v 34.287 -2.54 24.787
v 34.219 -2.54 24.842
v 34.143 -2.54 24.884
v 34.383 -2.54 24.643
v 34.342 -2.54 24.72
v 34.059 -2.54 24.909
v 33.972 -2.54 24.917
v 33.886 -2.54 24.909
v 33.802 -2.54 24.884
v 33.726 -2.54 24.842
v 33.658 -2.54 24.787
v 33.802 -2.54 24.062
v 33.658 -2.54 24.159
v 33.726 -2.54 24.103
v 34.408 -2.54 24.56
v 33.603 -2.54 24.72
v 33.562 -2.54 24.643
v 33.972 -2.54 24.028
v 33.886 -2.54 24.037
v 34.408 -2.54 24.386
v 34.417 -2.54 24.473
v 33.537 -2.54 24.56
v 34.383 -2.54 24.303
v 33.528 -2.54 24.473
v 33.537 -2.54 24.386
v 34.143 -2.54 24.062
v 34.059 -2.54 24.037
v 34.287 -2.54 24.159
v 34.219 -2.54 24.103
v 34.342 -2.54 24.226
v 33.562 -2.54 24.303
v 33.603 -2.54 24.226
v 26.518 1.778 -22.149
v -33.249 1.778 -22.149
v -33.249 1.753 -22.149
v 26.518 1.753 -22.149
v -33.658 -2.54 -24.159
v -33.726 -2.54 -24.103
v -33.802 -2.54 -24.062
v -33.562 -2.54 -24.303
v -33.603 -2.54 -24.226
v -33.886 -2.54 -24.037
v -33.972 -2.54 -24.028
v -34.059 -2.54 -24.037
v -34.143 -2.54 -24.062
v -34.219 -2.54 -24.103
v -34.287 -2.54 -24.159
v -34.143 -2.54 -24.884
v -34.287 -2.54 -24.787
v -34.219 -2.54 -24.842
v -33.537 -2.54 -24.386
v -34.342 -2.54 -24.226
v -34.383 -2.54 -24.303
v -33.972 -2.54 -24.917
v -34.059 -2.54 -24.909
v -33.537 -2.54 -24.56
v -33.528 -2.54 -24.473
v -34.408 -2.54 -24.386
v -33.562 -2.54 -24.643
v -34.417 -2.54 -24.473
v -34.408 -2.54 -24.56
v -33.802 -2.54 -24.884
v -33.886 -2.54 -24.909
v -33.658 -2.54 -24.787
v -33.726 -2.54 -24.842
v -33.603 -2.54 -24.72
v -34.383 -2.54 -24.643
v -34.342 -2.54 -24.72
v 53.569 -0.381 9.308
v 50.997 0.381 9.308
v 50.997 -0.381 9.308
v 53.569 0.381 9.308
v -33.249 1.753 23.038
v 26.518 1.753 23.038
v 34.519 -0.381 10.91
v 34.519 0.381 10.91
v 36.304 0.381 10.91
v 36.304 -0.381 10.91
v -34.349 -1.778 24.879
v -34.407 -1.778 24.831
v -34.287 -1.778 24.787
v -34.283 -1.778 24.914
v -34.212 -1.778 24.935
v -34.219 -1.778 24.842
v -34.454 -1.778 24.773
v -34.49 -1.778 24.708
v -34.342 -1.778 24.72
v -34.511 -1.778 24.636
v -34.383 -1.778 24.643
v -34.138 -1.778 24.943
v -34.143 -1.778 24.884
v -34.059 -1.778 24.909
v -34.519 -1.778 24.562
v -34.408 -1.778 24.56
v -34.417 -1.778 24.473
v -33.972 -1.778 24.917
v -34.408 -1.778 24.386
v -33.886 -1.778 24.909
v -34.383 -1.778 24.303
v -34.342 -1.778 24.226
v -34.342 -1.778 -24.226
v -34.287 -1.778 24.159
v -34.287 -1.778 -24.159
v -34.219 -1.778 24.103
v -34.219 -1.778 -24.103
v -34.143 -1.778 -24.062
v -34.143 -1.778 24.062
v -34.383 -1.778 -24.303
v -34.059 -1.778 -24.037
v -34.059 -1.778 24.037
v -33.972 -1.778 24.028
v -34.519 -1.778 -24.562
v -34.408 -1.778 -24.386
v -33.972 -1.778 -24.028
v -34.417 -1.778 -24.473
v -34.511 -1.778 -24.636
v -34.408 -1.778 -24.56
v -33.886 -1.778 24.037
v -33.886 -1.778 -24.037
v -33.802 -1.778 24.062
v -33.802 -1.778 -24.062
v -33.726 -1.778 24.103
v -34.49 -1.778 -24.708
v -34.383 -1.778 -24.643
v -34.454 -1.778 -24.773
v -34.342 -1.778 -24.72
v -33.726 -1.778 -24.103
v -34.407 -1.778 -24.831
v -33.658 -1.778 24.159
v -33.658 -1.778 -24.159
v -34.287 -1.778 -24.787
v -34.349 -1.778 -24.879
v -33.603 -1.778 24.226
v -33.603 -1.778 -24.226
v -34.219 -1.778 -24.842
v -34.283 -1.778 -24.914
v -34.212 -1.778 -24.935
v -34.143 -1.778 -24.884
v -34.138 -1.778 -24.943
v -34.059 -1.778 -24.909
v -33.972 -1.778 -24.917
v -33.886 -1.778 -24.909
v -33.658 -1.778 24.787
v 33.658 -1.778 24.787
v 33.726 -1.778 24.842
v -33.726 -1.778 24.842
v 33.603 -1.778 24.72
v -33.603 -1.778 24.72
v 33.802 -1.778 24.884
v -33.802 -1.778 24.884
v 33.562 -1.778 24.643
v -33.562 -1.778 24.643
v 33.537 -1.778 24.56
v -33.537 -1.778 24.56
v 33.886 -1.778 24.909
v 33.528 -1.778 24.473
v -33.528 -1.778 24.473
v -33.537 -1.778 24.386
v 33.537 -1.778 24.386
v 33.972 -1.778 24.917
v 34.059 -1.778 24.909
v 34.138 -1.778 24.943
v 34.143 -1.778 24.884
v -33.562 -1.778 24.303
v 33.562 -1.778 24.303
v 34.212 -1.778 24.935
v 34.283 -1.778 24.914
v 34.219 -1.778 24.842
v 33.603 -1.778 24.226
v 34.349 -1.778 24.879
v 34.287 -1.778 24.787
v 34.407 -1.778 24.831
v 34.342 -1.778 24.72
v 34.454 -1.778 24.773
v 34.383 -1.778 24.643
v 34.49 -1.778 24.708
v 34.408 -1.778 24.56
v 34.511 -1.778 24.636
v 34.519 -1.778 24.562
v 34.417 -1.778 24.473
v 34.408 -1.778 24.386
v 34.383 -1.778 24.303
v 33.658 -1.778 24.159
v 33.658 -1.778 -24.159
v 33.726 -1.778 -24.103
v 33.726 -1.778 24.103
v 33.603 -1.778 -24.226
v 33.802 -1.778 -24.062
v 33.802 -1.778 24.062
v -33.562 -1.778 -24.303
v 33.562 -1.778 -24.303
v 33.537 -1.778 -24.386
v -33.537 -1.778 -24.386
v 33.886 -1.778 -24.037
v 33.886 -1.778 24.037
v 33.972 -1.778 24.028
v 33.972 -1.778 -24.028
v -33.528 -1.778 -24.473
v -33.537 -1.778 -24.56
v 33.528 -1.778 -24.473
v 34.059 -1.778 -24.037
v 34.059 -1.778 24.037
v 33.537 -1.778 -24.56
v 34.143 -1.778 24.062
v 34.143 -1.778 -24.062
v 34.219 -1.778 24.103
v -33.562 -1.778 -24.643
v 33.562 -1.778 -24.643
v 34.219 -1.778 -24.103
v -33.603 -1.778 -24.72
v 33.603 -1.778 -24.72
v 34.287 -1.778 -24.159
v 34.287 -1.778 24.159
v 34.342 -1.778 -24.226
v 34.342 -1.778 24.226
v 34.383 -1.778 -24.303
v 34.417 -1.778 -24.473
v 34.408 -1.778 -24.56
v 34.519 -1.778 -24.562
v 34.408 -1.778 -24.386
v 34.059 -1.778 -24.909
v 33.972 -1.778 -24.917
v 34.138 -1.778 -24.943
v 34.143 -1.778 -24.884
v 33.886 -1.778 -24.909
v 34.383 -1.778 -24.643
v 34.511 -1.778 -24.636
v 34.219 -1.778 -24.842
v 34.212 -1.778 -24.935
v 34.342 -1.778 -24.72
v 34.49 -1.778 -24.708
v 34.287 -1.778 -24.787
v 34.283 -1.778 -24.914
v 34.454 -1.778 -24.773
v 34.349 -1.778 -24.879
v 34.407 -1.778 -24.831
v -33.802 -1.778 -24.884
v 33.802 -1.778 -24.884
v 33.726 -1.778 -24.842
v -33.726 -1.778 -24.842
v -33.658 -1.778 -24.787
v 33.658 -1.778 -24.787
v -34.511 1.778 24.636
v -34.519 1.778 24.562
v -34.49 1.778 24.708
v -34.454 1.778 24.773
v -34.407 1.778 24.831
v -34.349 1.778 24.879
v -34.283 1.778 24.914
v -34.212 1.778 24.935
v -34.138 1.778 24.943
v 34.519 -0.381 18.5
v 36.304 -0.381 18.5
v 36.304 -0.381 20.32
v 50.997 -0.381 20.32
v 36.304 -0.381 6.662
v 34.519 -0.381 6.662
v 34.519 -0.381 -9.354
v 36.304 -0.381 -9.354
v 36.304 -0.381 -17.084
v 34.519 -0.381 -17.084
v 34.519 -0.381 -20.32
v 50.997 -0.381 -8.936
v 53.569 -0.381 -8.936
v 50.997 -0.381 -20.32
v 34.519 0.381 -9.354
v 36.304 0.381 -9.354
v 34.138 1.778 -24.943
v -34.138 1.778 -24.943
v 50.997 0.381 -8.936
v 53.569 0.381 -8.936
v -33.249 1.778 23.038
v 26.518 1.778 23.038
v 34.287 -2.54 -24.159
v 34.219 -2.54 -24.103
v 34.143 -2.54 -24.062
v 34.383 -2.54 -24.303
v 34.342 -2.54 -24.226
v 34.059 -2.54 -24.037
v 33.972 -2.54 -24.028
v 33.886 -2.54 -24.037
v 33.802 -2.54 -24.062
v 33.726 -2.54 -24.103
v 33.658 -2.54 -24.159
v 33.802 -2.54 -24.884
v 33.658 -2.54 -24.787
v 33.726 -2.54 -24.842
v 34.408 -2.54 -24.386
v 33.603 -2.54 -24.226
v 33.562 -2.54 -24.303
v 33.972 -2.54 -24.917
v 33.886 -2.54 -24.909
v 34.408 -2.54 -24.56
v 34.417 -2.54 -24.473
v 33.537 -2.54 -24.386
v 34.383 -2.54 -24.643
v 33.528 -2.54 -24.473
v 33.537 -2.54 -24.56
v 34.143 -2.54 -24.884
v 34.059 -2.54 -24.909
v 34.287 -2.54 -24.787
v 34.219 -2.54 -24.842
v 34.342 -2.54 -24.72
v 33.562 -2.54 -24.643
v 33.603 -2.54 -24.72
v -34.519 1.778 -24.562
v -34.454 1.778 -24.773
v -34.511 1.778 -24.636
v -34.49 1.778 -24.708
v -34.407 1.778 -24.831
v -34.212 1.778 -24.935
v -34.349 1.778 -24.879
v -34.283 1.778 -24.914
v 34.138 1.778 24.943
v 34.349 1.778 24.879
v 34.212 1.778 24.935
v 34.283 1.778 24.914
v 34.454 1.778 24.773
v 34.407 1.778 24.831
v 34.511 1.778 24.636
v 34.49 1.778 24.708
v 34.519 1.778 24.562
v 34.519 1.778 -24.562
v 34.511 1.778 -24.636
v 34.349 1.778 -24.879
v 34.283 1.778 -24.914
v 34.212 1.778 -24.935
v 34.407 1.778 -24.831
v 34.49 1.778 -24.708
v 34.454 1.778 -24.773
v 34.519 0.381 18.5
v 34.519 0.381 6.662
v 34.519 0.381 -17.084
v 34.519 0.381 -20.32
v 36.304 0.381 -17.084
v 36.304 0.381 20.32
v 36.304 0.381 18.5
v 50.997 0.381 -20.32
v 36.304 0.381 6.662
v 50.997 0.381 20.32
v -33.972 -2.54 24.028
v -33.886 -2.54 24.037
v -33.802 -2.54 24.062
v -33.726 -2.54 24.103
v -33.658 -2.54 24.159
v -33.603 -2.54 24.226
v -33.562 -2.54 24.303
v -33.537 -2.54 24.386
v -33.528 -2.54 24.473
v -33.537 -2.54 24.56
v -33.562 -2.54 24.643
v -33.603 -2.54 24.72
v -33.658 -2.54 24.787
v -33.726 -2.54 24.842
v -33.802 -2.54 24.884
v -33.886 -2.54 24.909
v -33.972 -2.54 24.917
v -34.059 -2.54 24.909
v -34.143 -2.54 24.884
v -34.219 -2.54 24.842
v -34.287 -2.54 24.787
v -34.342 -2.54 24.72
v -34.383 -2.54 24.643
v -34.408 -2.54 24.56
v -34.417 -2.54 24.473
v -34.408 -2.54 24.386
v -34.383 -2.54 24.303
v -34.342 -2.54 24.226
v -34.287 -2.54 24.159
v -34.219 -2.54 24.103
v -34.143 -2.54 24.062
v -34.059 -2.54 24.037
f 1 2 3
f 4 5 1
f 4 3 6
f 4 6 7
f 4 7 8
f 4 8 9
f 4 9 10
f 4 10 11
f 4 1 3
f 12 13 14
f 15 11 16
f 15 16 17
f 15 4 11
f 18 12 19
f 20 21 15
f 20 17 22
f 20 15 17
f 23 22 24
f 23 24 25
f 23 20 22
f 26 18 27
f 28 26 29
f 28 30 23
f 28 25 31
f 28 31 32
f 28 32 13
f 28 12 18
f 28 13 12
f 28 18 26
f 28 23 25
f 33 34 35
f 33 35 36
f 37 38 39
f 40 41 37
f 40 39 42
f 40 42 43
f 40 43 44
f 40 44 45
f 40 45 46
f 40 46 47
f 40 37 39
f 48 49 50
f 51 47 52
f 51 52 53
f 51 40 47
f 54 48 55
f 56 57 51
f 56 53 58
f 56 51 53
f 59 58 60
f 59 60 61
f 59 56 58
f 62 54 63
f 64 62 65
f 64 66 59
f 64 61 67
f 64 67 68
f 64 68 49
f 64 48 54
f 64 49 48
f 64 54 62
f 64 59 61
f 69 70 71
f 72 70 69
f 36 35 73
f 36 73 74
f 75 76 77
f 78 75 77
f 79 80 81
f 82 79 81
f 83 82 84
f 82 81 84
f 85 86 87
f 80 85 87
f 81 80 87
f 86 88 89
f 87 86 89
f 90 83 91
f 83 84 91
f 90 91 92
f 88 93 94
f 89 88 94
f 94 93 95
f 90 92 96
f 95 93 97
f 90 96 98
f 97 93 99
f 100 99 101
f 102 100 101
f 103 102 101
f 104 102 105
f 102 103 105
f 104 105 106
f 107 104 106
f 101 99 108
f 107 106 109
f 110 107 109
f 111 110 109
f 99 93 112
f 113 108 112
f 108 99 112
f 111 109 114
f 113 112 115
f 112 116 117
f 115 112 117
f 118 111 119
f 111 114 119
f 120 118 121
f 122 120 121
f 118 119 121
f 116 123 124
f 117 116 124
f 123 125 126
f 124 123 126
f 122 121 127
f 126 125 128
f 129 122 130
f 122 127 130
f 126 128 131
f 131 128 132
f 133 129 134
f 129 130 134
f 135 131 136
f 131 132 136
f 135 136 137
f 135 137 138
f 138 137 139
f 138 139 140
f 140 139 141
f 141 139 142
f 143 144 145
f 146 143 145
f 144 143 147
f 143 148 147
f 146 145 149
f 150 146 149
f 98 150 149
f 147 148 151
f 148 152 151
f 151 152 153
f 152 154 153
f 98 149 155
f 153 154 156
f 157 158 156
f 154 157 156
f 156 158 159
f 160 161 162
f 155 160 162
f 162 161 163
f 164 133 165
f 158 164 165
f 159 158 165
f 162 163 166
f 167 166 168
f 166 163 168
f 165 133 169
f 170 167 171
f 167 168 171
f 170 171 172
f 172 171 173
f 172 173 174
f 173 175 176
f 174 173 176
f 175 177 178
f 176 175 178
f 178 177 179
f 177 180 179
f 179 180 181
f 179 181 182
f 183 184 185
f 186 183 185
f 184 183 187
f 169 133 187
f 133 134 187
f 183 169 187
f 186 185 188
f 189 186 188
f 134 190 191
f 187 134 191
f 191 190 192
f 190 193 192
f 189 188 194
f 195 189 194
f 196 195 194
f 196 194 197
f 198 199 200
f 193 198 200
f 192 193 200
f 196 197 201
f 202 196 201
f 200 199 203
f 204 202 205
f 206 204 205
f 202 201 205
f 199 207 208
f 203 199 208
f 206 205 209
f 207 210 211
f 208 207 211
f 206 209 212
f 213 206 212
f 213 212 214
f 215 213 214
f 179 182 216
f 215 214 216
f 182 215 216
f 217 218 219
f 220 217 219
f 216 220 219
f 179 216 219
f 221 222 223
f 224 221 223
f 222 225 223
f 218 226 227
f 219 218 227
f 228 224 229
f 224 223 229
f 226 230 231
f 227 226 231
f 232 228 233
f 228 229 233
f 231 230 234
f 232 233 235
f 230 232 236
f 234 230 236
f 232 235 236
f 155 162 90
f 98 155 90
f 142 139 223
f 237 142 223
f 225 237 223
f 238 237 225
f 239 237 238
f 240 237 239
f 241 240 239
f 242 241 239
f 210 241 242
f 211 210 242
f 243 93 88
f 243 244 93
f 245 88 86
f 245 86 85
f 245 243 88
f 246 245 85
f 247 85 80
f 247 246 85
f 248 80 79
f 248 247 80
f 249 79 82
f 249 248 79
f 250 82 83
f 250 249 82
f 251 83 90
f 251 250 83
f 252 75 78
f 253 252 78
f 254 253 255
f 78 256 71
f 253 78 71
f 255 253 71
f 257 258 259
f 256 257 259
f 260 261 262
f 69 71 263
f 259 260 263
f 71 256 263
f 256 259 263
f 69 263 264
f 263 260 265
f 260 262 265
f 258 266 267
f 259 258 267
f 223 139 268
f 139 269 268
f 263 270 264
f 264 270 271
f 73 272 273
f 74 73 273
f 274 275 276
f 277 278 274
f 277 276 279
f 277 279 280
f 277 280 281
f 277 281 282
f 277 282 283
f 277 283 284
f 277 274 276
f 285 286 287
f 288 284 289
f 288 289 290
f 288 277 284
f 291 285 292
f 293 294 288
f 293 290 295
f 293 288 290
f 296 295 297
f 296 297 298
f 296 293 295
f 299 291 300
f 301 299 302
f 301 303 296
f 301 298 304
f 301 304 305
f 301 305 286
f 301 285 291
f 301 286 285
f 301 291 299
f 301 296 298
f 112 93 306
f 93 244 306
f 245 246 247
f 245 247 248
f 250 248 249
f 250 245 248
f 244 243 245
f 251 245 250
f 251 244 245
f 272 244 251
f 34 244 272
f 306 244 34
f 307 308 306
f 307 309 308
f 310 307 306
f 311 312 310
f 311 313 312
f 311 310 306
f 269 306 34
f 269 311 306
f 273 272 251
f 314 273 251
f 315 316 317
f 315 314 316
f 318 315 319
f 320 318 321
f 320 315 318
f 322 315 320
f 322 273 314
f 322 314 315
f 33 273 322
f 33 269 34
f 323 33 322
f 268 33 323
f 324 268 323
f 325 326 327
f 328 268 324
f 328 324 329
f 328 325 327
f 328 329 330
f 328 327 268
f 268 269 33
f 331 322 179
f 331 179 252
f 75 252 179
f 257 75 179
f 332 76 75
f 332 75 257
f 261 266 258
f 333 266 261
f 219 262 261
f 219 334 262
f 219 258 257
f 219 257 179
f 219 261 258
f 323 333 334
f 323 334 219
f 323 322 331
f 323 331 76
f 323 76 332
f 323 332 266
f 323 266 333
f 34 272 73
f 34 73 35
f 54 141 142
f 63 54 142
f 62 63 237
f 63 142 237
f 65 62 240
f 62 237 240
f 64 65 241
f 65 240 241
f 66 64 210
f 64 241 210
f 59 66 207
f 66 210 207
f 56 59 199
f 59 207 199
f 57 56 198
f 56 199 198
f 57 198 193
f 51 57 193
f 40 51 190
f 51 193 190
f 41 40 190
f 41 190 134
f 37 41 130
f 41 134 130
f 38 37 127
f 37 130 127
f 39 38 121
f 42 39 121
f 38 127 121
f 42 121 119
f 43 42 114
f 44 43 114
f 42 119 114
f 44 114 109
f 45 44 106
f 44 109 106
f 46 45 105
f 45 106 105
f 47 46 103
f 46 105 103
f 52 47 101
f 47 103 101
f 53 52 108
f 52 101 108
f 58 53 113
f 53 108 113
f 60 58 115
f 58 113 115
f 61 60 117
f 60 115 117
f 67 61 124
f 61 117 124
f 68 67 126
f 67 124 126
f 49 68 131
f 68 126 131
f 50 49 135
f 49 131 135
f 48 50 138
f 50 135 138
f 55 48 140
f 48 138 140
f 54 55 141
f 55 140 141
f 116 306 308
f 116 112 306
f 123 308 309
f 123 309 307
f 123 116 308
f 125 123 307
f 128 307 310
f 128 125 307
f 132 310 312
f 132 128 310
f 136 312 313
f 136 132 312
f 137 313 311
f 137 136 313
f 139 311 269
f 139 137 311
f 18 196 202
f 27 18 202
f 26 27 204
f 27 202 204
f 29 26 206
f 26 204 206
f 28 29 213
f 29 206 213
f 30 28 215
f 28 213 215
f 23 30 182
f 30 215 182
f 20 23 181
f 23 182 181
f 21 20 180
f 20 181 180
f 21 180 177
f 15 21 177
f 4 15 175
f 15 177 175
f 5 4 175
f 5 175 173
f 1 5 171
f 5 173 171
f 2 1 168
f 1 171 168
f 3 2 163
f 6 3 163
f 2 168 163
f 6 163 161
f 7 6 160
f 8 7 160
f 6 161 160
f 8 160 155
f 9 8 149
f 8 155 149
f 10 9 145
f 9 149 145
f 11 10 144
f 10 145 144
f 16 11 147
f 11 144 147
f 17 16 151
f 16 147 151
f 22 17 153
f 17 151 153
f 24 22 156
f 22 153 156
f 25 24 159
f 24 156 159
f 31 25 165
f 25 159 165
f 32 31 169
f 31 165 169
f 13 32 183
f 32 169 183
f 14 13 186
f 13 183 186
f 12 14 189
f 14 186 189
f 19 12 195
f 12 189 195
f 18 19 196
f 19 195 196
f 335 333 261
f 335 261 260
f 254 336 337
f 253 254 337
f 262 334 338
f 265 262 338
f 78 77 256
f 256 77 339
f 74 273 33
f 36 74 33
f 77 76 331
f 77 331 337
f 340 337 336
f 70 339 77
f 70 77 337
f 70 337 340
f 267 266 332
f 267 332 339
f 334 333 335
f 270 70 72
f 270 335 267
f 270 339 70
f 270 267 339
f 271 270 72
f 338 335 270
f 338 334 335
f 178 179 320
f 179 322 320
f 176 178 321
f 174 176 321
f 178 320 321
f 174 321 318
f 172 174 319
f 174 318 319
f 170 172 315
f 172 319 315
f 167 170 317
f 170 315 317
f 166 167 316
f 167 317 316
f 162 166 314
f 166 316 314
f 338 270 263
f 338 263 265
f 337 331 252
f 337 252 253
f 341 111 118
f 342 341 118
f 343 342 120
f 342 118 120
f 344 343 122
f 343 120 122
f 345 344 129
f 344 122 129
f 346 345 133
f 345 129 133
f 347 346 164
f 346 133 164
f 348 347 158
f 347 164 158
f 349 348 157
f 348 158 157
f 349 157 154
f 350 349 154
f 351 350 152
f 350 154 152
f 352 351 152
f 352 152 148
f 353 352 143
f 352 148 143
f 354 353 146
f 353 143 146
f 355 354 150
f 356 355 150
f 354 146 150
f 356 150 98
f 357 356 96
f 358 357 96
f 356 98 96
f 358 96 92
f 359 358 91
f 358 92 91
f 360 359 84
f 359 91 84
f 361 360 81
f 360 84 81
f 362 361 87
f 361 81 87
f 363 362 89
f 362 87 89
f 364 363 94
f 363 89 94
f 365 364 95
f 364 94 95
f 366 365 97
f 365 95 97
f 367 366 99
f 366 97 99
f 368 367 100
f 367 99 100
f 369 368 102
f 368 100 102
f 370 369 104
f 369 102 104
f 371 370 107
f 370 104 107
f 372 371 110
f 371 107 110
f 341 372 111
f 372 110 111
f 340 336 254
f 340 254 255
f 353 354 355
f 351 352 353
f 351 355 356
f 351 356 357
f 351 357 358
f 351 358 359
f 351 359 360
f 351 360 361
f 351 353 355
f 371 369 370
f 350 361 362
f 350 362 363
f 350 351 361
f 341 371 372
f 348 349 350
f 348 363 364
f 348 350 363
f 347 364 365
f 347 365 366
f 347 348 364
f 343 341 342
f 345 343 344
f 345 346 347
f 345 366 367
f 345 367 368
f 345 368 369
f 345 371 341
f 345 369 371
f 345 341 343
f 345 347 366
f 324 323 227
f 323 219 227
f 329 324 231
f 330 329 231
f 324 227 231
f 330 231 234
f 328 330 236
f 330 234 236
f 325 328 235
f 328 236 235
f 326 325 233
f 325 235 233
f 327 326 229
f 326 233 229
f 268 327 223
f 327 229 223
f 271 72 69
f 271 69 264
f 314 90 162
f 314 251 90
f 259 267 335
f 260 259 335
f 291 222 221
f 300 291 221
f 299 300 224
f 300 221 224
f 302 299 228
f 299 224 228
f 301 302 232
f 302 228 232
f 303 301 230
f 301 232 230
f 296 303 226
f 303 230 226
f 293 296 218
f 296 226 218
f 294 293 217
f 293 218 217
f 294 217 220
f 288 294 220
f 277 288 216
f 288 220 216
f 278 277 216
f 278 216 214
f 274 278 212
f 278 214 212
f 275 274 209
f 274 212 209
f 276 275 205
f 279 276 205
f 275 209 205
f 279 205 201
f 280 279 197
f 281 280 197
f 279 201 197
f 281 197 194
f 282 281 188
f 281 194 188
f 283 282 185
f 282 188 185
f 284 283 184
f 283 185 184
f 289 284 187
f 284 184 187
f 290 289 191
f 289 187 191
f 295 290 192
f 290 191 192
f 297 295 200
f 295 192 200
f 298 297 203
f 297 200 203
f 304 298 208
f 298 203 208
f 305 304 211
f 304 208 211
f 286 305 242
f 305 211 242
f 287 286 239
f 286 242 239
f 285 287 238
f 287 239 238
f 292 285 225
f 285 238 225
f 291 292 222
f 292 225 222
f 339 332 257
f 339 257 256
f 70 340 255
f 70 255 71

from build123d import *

# Parameters (mm, degrees)
SKETCH1_W           = 69.0372
SKETCH1_H           = 49.8856
BOSS_EXTRUDE1_DEPTH = 1.778
FILLET1_R           = 0.381
SKETCH2_W           = 59.7662
SKETCH2_H           = 45.1866
CUT_EXTRUDE1_DEPTH  = 0.0254
SKETCH3_R           = 0.4445
BOSS_EXTRUDE2_DEPTH = 0.762
SKETCH5_W           = 19.05
SKETCH5_H           = 40.64
BOSS_EXTRUDE3_DEPTH = 0.381
SKETCH6_W           = 2.571951578
SKETCH6_H           = 11.383775042
SKETCH6_H_2         = 11.011674943
SKETCH6_W_2         = 1.784918448
SKETCH6_H_3         = 1.819764249
SKETCH6_H_4         = 4.247776912
SKETCH6_H_5         = 7.729561266
CUT_EXTRUDE2_DEPTH  = 60.163083243


with BuildPart() as part:
    # Sketch1 → Boss-Extrude1 (new, symmetric)
    with BuildSketch(Plane(origin=(0, 0, 0), x_dir=(1, 0, 0), z_dir=(0, 1, 0))):
        Rectangle(SKETCH1_W, SKETCH1_H)
    extrude(amount=BOSS_EXTRUDE1_DEPTH, both=True)

    # Fillet1
    fillet1_edges = [part.edges().sort_by_distance(p)[0] for p in [
        (34.5186, 0, 24.9428),
        (-34.5186, 0, 24.9428),
        (-34.5186, 0, -24.9428),
        (34.5186, 0, -24.9428),
    ]]
    fillet(fillet1_edges, radius=FILLET1_R)

    # Sketch2 → Cut-Extrude1 (cut)
    with BuildSketch(Plane(origin=(0, 1.778, 0), x_dir=(1, 0, 0), z_dir=(0, 1, 0))):
        with Locations((-3.3655, -0.4445)):
            Rectangle(SKETCH2_W, SKETCH2_H)
    extrude(amount=-CUT_EXTRUDE1_DEPTH, mode=Mode.SUBTRACT)

    # Sketch3 → Boss-Extrude2 (add)
    with BuildSketch(Plane.XZ.offset(1.778)):
        with Locations(Location((-33.9725, 24.4729, 0), (0, 0, 270))):
            Circle(SKETCH3_R)
        with Locations(Location((33.9725, 24.4729, 0), (0, 0, 270))):
            Circle(SKETCH3_R)
        with Locations(Location((33.9725, -24.4729, 0), (0, 0, 270))):
            Circle(SKETCH3_R)
        with Locations(Location((-33.9725, -24.4729, 0), (0, 0, 270))):
            Circle(SKETCH3_R)
    extrude(amount=BOSS_EXTRUDE2_DEPTH)

    # Sketch5 → Boss-Extrude3 (add, symmetric)
    with BuildSketch(Plane(origin=(0, 0, 0), x_dir=(1, 0, 0), z_dir=(0, 1, 0))):
        with Locations((44.0436, 0)):
            Rectangle(SKETCH5_W, SKETCH5_H)
    extrude(amount=BOSS_EXTRUDE3_DEPTH, both=True)

    # Sketch6 → Cut-Extrude2 (cut, through all)
    with BuildSketch(Plane(origin=(0, 0.381, 0), x_dir=(1, 0, 0), z_dir=(0, 1, 0))):
        with Locations((52.282624211, 14.628112479)):
            Rectangle(SKETCH6_W, SKETCH6_H)
        with Locations((52.282624211, -14.814162529)):
            Rectangle(SKETCH6_W, SKETCH6_H_2)
        with Locations((35.411059224, -19.410117875)):
            Rectangle(SKETCH6_W_2, SKETCH6_H_3)
        with Locations((35.411059224, -8.786057404)):
            Rectangle(SKETCH6_W_2, SKETCH6_H_4)
        with Locations((35.411059224, 13.218819714)):
            Rectangle(SKETCH6_W_2, SKETCH6_H_5)
    extrude(amount=-CUT_EXTRUDE2_DEPTH, mode=Mode.SUBTRACT)


solid = part.part
